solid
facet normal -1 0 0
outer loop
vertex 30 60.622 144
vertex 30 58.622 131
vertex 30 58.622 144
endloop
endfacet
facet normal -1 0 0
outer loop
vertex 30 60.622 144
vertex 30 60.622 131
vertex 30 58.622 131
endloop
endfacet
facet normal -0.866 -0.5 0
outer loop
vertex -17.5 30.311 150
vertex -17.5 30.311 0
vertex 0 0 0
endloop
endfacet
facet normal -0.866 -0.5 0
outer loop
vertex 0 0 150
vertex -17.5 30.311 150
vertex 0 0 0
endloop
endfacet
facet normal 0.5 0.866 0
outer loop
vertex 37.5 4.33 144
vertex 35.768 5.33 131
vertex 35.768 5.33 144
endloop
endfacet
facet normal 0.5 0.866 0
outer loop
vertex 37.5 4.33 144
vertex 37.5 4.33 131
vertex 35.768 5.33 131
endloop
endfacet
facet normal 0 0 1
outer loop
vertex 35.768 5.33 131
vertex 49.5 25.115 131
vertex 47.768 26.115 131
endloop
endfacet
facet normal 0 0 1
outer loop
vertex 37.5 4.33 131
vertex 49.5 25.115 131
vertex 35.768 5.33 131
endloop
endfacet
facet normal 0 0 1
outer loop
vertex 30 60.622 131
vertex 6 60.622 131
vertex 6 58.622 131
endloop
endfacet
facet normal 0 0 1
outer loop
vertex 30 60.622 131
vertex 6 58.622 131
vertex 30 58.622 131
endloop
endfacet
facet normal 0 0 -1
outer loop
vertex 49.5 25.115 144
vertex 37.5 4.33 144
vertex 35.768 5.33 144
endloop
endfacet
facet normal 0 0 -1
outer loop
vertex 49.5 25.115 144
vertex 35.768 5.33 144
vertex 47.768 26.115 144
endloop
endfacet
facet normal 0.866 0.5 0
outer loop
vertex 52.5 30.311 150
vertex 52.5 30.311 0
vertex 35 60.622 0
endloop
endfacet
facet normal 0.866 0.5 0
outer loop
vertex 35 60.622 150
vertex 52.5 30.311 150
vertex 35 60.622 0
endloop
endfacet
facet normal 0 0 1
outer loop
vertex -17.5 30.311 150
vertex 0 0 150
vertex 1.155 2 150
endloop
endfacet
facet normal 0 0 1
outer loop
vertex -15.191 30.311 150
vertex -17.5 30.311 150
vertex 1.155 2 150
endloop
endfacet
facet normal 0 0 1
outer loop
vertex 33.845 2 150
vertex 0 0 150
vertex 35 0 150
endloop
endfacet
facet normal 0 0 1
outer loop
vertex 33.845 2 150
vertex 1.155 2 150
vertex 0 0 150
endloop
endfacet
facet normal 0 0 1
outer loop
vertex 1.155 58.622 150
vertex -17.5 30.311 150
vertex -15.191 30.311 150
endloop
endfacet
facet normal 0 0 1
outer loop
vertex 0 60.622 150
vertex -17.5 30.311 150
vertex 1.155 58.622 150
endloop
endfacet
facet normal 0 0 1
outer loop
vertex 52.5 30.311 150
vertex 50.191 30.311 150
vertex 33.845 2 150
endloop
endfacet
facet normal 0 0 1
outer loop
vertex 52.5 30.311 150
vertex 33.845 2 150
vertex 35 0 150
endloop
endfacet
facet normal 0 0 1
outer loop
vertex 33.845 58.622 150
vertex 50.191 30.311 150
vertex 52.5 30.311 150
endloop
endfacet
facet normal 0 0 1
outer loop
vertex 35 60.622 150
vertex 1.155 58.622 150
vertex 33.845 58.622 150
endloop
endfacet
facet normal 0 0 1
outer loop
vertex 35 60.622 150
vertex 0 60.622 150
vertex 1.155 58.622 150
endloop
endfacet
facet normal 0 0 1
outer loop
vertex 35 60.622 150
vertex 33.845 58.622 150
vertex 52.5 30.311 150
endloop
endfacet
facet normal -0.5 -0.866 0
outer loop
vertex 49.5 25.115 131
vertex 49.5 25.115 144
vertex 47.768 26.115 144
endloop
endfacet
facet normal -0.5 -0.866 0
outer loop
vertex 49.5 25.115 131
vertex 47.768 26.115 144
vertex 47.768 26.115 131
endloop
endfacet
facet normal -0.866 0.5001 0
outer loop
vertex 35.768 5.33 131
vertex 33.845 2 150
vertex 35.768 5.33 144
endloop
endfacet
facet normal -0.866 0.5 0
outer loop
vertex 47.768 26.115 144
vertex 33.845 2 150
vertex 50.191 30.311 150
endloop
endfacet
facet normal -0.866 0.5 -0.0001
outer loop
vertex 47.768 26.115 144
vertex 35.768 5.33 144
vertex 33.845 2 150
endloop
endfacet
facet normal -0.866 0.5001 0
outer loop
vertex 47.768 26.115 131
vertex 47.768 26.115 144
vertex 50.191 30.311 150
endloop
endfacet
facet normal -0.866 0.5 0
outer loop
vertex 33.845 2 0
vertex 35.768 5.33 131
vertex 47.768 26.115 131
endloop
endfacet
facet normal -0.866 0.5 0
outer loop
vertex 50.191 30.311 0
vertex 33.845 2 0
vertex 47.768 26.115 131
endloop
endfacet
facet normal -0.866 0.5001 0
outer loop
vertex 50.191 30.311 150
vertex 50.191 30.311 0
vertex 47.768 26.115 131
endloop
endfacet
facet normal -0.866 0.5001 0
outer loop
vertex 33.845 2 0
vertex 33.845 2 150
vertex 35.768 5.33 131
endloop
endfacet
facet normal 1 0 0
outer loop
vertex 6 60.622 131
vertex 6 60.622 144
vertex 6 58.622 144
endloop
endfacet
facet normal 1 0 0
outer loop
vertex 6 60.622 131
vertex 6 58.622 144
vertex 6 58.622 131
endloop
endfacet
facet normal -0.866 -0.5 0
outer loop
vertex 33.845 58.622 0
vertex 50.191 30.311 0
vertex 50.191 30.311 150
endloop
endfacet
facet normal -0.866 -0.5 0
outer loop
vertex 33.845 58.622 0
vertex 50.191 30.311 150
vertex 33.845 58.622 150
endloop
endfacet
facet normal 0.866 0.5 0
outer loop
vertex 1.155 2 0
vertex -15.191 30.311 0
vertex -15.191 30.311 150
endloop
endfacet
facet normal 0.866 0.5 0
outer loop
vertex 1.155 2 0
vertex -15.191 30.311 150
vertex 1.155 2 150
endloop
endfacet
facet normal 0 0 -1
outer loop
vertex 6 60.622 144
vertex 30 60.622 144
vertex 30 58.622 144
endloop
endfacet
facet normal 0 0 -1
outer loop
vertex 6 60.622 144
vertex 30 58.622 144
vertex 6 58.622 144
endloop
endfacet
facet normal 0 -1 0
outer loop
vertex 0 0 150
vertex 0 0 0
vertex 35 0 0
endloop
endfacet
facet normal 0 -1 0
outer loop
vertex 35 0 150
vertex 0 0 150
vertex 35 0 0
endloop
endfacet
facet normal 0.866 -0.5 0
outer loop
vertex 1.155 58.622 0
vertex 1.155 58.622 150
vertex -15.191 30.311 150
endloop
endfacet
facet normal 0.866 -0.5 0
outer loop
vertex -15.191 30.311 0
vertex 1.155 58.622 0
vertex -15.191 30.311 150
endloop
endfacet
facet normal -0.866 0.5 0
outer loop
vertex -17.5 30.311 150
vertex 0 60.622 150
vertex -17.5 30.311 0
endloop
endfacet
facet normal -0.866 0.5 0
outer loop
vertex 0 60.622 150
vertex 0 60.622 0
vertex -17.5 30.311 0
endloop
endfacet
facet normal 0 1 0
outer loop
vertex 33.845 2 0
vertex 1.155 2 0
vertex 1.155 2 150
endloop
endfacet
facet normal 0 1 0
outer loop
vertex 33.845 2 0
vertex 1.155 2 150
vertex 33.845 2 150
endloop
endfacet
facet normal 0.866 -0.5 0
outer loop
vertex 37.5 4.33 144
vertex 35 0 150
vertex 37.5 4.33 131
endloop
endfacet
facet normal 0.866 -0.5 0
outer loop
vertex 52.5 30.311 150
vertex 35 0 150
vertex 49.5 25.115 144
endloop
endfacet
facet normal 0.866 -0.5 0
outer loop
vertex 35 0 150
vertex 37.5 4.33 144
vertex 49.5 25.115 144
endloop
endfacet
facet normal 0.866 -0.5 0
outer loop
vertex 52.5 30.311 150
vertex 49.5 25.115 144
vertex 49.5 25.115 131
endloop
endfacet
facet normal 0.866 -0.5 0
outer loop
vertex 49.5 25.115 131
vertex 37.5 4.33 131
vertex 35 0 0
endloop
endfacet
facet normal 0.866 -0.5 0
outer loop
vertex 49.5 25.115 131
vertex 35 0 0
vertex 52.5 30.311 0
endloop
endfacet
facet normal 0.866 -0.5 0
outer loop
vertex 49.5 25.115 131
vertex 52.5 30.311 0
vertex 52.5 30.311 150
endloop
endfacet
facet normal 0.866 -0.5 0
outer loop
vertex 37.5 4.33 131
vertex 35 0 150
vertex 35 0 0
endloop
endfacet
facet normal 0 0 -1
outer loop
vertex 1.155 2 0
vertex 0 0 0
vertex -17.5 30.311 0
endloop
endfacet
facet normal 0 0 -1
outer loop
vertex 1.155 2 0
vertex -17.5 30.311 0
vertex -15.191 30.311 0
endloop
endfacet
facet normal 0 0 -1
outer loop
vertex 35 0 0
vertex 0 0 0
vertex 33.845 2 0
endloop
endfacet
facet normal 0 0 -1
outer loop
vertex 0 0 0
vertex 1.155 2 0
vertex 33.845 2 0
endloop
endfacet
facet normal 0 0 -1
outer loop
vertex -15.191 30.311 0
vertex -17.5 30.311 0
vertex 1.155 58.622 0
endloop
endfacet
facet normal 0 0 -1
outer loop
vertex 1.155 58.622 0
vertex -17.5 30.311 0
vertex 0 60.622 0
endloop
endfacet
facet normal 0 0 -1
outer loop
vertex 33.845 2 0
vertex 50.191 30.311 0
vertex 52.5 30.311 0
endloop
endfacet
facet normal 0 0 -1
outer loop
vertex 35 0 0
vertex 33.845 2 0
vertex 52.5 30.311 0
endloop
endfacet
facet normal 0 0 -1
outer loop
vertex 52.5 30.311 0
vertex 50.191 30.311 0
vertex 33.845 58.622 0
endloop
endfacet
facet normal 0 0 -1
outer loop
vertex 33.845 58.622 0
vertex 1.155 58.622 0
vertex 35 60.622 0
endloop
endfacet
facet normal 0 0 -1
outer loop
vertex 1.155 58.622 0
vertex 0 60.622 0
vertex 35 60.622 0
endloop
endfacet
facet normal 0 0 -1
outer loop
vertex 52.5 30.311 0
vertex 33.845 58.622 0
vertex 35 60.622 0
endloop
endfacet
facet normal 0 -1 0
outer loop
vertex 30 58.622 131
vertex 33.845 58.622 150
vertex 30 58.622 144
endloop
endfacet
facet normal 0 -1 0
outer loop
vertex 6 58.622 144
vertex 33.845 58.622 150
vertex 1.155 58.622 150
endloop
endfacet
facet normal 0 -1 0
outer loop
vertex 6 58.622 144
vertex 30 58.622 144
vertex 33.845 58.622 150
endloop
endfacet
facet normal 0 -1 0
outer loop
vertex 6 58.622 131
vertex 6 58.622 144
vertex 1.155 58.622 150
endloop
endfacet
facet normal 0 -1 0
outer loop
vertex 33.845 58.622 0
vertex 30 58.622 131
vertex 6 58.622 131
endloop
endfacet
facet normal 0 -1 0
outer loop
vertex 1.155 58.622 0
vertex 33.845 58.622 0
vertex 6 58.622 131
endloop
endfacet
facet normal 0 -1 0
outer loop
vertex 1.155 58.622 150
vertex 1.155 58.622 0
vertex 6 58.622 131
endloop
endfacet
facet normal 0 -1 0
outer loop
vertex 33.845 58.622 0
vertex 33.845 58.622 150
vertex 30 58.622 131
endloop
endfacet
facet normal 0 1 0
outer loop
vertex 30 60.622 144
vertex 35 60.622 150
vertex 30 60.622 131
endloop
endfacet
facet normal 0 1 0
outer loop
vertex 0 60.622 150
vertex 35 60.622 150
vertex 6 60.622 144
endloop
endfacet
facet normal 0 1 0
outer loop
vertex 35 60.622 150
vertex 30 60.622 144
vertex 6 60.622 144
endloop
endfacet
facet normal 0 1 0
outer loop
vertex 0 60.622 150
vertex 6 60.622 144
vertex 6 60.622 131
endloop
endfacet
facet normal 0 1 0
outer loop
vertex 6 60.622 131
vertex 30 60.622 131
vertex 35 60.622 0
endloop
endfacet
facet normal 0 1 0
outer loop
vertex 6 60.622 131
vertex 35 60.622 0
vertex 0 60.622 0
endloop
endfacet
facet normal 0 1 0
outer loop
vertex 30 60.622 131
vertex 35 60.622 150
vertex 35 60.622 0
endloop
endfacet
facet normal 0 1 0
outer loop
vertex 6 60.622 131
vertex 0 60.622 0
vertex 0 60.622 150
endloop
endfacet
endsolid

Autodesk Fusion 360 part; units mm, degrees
sketch "Sketch1" plane through (0, 0, 0) normal (0, 0, 1) x (1, 0, 0)
  line L0 (0, 0) -> (35, 0)
  line L1 (35, 0) -> (52.5, 30.3109)
  line L2 (52.5, 30.3109) -> (35, 60.6218)
  line L3 (35, 60.6218) -> (0, 60.6218)
  line L4 (0, 60.6218) -> (-17.5, 30.3109)
  line L5 (-17.5, 30.3109) -> (0, 0)
  point P0 (17.5, 30.3109)
extrude "Extrude1" add sketch "Sketch1" along normal blind 150
shell "Shell1" thickness 2 removed faces 2 at (11.6667, 20.2073, 0) at (11.6667, 20.2073, 150)
sketch "Sketch2" plane through (0, 60.6218, 0) normal (0, 1, 0) x (-1, 0, 0)
  line L0 (-35, 0) -> (0, 0)
  line L1 (0, 0) -> (0, 150)
  line L2 (0, 150) -> (-35, 150)
  line L3 (-35, 150) -> (-35, 0)
  line L4 (-30, 144) -> (-6, 144)
  line L5 (-6, 144) -> (-6, 131)
  line L6 (-6, 131) -> (-30, 131)
  line L7 (-30, 131) -> (-30, 144)
extrude "Extrude2" cut sketch "Sketch2" against normal blind 12 contours L4 L5 L6 L7
sketch "Sketch3" plane through (0, 0, 0) normal (0, 0, 1) x (1, 0, 0)
  line L0 (0, 12) -> (0, 18)
sketch "Sketch4" plane through (26.25, -15.1554, 0) normal (0.866, -0.5, 0) x (0.5, 0.866, 0)
  line L0 (17.5, 0) -> (52.5, 0)
  line L1 (52.5, 0) -> (52.5, 150)
  line L2 (52.5, 150) -> (17.5, 150)
  line L3 (17.5, 150) -> (17.5, 0)
  line L4 (22.5, 144) -> (46.5, 144)
  line L5 (46.5, 144) -> (46.5, 131)
  line L6 (46.5, 131) -> (22.5, 131)
  line L7 (22.5, 131) -> (22.5, 144)
  point P0 (22.5, 144)
extrude "Extrude3" cut sketch "Sketch4" against normal blind 5.622 contours L4 L5 L6 L7
